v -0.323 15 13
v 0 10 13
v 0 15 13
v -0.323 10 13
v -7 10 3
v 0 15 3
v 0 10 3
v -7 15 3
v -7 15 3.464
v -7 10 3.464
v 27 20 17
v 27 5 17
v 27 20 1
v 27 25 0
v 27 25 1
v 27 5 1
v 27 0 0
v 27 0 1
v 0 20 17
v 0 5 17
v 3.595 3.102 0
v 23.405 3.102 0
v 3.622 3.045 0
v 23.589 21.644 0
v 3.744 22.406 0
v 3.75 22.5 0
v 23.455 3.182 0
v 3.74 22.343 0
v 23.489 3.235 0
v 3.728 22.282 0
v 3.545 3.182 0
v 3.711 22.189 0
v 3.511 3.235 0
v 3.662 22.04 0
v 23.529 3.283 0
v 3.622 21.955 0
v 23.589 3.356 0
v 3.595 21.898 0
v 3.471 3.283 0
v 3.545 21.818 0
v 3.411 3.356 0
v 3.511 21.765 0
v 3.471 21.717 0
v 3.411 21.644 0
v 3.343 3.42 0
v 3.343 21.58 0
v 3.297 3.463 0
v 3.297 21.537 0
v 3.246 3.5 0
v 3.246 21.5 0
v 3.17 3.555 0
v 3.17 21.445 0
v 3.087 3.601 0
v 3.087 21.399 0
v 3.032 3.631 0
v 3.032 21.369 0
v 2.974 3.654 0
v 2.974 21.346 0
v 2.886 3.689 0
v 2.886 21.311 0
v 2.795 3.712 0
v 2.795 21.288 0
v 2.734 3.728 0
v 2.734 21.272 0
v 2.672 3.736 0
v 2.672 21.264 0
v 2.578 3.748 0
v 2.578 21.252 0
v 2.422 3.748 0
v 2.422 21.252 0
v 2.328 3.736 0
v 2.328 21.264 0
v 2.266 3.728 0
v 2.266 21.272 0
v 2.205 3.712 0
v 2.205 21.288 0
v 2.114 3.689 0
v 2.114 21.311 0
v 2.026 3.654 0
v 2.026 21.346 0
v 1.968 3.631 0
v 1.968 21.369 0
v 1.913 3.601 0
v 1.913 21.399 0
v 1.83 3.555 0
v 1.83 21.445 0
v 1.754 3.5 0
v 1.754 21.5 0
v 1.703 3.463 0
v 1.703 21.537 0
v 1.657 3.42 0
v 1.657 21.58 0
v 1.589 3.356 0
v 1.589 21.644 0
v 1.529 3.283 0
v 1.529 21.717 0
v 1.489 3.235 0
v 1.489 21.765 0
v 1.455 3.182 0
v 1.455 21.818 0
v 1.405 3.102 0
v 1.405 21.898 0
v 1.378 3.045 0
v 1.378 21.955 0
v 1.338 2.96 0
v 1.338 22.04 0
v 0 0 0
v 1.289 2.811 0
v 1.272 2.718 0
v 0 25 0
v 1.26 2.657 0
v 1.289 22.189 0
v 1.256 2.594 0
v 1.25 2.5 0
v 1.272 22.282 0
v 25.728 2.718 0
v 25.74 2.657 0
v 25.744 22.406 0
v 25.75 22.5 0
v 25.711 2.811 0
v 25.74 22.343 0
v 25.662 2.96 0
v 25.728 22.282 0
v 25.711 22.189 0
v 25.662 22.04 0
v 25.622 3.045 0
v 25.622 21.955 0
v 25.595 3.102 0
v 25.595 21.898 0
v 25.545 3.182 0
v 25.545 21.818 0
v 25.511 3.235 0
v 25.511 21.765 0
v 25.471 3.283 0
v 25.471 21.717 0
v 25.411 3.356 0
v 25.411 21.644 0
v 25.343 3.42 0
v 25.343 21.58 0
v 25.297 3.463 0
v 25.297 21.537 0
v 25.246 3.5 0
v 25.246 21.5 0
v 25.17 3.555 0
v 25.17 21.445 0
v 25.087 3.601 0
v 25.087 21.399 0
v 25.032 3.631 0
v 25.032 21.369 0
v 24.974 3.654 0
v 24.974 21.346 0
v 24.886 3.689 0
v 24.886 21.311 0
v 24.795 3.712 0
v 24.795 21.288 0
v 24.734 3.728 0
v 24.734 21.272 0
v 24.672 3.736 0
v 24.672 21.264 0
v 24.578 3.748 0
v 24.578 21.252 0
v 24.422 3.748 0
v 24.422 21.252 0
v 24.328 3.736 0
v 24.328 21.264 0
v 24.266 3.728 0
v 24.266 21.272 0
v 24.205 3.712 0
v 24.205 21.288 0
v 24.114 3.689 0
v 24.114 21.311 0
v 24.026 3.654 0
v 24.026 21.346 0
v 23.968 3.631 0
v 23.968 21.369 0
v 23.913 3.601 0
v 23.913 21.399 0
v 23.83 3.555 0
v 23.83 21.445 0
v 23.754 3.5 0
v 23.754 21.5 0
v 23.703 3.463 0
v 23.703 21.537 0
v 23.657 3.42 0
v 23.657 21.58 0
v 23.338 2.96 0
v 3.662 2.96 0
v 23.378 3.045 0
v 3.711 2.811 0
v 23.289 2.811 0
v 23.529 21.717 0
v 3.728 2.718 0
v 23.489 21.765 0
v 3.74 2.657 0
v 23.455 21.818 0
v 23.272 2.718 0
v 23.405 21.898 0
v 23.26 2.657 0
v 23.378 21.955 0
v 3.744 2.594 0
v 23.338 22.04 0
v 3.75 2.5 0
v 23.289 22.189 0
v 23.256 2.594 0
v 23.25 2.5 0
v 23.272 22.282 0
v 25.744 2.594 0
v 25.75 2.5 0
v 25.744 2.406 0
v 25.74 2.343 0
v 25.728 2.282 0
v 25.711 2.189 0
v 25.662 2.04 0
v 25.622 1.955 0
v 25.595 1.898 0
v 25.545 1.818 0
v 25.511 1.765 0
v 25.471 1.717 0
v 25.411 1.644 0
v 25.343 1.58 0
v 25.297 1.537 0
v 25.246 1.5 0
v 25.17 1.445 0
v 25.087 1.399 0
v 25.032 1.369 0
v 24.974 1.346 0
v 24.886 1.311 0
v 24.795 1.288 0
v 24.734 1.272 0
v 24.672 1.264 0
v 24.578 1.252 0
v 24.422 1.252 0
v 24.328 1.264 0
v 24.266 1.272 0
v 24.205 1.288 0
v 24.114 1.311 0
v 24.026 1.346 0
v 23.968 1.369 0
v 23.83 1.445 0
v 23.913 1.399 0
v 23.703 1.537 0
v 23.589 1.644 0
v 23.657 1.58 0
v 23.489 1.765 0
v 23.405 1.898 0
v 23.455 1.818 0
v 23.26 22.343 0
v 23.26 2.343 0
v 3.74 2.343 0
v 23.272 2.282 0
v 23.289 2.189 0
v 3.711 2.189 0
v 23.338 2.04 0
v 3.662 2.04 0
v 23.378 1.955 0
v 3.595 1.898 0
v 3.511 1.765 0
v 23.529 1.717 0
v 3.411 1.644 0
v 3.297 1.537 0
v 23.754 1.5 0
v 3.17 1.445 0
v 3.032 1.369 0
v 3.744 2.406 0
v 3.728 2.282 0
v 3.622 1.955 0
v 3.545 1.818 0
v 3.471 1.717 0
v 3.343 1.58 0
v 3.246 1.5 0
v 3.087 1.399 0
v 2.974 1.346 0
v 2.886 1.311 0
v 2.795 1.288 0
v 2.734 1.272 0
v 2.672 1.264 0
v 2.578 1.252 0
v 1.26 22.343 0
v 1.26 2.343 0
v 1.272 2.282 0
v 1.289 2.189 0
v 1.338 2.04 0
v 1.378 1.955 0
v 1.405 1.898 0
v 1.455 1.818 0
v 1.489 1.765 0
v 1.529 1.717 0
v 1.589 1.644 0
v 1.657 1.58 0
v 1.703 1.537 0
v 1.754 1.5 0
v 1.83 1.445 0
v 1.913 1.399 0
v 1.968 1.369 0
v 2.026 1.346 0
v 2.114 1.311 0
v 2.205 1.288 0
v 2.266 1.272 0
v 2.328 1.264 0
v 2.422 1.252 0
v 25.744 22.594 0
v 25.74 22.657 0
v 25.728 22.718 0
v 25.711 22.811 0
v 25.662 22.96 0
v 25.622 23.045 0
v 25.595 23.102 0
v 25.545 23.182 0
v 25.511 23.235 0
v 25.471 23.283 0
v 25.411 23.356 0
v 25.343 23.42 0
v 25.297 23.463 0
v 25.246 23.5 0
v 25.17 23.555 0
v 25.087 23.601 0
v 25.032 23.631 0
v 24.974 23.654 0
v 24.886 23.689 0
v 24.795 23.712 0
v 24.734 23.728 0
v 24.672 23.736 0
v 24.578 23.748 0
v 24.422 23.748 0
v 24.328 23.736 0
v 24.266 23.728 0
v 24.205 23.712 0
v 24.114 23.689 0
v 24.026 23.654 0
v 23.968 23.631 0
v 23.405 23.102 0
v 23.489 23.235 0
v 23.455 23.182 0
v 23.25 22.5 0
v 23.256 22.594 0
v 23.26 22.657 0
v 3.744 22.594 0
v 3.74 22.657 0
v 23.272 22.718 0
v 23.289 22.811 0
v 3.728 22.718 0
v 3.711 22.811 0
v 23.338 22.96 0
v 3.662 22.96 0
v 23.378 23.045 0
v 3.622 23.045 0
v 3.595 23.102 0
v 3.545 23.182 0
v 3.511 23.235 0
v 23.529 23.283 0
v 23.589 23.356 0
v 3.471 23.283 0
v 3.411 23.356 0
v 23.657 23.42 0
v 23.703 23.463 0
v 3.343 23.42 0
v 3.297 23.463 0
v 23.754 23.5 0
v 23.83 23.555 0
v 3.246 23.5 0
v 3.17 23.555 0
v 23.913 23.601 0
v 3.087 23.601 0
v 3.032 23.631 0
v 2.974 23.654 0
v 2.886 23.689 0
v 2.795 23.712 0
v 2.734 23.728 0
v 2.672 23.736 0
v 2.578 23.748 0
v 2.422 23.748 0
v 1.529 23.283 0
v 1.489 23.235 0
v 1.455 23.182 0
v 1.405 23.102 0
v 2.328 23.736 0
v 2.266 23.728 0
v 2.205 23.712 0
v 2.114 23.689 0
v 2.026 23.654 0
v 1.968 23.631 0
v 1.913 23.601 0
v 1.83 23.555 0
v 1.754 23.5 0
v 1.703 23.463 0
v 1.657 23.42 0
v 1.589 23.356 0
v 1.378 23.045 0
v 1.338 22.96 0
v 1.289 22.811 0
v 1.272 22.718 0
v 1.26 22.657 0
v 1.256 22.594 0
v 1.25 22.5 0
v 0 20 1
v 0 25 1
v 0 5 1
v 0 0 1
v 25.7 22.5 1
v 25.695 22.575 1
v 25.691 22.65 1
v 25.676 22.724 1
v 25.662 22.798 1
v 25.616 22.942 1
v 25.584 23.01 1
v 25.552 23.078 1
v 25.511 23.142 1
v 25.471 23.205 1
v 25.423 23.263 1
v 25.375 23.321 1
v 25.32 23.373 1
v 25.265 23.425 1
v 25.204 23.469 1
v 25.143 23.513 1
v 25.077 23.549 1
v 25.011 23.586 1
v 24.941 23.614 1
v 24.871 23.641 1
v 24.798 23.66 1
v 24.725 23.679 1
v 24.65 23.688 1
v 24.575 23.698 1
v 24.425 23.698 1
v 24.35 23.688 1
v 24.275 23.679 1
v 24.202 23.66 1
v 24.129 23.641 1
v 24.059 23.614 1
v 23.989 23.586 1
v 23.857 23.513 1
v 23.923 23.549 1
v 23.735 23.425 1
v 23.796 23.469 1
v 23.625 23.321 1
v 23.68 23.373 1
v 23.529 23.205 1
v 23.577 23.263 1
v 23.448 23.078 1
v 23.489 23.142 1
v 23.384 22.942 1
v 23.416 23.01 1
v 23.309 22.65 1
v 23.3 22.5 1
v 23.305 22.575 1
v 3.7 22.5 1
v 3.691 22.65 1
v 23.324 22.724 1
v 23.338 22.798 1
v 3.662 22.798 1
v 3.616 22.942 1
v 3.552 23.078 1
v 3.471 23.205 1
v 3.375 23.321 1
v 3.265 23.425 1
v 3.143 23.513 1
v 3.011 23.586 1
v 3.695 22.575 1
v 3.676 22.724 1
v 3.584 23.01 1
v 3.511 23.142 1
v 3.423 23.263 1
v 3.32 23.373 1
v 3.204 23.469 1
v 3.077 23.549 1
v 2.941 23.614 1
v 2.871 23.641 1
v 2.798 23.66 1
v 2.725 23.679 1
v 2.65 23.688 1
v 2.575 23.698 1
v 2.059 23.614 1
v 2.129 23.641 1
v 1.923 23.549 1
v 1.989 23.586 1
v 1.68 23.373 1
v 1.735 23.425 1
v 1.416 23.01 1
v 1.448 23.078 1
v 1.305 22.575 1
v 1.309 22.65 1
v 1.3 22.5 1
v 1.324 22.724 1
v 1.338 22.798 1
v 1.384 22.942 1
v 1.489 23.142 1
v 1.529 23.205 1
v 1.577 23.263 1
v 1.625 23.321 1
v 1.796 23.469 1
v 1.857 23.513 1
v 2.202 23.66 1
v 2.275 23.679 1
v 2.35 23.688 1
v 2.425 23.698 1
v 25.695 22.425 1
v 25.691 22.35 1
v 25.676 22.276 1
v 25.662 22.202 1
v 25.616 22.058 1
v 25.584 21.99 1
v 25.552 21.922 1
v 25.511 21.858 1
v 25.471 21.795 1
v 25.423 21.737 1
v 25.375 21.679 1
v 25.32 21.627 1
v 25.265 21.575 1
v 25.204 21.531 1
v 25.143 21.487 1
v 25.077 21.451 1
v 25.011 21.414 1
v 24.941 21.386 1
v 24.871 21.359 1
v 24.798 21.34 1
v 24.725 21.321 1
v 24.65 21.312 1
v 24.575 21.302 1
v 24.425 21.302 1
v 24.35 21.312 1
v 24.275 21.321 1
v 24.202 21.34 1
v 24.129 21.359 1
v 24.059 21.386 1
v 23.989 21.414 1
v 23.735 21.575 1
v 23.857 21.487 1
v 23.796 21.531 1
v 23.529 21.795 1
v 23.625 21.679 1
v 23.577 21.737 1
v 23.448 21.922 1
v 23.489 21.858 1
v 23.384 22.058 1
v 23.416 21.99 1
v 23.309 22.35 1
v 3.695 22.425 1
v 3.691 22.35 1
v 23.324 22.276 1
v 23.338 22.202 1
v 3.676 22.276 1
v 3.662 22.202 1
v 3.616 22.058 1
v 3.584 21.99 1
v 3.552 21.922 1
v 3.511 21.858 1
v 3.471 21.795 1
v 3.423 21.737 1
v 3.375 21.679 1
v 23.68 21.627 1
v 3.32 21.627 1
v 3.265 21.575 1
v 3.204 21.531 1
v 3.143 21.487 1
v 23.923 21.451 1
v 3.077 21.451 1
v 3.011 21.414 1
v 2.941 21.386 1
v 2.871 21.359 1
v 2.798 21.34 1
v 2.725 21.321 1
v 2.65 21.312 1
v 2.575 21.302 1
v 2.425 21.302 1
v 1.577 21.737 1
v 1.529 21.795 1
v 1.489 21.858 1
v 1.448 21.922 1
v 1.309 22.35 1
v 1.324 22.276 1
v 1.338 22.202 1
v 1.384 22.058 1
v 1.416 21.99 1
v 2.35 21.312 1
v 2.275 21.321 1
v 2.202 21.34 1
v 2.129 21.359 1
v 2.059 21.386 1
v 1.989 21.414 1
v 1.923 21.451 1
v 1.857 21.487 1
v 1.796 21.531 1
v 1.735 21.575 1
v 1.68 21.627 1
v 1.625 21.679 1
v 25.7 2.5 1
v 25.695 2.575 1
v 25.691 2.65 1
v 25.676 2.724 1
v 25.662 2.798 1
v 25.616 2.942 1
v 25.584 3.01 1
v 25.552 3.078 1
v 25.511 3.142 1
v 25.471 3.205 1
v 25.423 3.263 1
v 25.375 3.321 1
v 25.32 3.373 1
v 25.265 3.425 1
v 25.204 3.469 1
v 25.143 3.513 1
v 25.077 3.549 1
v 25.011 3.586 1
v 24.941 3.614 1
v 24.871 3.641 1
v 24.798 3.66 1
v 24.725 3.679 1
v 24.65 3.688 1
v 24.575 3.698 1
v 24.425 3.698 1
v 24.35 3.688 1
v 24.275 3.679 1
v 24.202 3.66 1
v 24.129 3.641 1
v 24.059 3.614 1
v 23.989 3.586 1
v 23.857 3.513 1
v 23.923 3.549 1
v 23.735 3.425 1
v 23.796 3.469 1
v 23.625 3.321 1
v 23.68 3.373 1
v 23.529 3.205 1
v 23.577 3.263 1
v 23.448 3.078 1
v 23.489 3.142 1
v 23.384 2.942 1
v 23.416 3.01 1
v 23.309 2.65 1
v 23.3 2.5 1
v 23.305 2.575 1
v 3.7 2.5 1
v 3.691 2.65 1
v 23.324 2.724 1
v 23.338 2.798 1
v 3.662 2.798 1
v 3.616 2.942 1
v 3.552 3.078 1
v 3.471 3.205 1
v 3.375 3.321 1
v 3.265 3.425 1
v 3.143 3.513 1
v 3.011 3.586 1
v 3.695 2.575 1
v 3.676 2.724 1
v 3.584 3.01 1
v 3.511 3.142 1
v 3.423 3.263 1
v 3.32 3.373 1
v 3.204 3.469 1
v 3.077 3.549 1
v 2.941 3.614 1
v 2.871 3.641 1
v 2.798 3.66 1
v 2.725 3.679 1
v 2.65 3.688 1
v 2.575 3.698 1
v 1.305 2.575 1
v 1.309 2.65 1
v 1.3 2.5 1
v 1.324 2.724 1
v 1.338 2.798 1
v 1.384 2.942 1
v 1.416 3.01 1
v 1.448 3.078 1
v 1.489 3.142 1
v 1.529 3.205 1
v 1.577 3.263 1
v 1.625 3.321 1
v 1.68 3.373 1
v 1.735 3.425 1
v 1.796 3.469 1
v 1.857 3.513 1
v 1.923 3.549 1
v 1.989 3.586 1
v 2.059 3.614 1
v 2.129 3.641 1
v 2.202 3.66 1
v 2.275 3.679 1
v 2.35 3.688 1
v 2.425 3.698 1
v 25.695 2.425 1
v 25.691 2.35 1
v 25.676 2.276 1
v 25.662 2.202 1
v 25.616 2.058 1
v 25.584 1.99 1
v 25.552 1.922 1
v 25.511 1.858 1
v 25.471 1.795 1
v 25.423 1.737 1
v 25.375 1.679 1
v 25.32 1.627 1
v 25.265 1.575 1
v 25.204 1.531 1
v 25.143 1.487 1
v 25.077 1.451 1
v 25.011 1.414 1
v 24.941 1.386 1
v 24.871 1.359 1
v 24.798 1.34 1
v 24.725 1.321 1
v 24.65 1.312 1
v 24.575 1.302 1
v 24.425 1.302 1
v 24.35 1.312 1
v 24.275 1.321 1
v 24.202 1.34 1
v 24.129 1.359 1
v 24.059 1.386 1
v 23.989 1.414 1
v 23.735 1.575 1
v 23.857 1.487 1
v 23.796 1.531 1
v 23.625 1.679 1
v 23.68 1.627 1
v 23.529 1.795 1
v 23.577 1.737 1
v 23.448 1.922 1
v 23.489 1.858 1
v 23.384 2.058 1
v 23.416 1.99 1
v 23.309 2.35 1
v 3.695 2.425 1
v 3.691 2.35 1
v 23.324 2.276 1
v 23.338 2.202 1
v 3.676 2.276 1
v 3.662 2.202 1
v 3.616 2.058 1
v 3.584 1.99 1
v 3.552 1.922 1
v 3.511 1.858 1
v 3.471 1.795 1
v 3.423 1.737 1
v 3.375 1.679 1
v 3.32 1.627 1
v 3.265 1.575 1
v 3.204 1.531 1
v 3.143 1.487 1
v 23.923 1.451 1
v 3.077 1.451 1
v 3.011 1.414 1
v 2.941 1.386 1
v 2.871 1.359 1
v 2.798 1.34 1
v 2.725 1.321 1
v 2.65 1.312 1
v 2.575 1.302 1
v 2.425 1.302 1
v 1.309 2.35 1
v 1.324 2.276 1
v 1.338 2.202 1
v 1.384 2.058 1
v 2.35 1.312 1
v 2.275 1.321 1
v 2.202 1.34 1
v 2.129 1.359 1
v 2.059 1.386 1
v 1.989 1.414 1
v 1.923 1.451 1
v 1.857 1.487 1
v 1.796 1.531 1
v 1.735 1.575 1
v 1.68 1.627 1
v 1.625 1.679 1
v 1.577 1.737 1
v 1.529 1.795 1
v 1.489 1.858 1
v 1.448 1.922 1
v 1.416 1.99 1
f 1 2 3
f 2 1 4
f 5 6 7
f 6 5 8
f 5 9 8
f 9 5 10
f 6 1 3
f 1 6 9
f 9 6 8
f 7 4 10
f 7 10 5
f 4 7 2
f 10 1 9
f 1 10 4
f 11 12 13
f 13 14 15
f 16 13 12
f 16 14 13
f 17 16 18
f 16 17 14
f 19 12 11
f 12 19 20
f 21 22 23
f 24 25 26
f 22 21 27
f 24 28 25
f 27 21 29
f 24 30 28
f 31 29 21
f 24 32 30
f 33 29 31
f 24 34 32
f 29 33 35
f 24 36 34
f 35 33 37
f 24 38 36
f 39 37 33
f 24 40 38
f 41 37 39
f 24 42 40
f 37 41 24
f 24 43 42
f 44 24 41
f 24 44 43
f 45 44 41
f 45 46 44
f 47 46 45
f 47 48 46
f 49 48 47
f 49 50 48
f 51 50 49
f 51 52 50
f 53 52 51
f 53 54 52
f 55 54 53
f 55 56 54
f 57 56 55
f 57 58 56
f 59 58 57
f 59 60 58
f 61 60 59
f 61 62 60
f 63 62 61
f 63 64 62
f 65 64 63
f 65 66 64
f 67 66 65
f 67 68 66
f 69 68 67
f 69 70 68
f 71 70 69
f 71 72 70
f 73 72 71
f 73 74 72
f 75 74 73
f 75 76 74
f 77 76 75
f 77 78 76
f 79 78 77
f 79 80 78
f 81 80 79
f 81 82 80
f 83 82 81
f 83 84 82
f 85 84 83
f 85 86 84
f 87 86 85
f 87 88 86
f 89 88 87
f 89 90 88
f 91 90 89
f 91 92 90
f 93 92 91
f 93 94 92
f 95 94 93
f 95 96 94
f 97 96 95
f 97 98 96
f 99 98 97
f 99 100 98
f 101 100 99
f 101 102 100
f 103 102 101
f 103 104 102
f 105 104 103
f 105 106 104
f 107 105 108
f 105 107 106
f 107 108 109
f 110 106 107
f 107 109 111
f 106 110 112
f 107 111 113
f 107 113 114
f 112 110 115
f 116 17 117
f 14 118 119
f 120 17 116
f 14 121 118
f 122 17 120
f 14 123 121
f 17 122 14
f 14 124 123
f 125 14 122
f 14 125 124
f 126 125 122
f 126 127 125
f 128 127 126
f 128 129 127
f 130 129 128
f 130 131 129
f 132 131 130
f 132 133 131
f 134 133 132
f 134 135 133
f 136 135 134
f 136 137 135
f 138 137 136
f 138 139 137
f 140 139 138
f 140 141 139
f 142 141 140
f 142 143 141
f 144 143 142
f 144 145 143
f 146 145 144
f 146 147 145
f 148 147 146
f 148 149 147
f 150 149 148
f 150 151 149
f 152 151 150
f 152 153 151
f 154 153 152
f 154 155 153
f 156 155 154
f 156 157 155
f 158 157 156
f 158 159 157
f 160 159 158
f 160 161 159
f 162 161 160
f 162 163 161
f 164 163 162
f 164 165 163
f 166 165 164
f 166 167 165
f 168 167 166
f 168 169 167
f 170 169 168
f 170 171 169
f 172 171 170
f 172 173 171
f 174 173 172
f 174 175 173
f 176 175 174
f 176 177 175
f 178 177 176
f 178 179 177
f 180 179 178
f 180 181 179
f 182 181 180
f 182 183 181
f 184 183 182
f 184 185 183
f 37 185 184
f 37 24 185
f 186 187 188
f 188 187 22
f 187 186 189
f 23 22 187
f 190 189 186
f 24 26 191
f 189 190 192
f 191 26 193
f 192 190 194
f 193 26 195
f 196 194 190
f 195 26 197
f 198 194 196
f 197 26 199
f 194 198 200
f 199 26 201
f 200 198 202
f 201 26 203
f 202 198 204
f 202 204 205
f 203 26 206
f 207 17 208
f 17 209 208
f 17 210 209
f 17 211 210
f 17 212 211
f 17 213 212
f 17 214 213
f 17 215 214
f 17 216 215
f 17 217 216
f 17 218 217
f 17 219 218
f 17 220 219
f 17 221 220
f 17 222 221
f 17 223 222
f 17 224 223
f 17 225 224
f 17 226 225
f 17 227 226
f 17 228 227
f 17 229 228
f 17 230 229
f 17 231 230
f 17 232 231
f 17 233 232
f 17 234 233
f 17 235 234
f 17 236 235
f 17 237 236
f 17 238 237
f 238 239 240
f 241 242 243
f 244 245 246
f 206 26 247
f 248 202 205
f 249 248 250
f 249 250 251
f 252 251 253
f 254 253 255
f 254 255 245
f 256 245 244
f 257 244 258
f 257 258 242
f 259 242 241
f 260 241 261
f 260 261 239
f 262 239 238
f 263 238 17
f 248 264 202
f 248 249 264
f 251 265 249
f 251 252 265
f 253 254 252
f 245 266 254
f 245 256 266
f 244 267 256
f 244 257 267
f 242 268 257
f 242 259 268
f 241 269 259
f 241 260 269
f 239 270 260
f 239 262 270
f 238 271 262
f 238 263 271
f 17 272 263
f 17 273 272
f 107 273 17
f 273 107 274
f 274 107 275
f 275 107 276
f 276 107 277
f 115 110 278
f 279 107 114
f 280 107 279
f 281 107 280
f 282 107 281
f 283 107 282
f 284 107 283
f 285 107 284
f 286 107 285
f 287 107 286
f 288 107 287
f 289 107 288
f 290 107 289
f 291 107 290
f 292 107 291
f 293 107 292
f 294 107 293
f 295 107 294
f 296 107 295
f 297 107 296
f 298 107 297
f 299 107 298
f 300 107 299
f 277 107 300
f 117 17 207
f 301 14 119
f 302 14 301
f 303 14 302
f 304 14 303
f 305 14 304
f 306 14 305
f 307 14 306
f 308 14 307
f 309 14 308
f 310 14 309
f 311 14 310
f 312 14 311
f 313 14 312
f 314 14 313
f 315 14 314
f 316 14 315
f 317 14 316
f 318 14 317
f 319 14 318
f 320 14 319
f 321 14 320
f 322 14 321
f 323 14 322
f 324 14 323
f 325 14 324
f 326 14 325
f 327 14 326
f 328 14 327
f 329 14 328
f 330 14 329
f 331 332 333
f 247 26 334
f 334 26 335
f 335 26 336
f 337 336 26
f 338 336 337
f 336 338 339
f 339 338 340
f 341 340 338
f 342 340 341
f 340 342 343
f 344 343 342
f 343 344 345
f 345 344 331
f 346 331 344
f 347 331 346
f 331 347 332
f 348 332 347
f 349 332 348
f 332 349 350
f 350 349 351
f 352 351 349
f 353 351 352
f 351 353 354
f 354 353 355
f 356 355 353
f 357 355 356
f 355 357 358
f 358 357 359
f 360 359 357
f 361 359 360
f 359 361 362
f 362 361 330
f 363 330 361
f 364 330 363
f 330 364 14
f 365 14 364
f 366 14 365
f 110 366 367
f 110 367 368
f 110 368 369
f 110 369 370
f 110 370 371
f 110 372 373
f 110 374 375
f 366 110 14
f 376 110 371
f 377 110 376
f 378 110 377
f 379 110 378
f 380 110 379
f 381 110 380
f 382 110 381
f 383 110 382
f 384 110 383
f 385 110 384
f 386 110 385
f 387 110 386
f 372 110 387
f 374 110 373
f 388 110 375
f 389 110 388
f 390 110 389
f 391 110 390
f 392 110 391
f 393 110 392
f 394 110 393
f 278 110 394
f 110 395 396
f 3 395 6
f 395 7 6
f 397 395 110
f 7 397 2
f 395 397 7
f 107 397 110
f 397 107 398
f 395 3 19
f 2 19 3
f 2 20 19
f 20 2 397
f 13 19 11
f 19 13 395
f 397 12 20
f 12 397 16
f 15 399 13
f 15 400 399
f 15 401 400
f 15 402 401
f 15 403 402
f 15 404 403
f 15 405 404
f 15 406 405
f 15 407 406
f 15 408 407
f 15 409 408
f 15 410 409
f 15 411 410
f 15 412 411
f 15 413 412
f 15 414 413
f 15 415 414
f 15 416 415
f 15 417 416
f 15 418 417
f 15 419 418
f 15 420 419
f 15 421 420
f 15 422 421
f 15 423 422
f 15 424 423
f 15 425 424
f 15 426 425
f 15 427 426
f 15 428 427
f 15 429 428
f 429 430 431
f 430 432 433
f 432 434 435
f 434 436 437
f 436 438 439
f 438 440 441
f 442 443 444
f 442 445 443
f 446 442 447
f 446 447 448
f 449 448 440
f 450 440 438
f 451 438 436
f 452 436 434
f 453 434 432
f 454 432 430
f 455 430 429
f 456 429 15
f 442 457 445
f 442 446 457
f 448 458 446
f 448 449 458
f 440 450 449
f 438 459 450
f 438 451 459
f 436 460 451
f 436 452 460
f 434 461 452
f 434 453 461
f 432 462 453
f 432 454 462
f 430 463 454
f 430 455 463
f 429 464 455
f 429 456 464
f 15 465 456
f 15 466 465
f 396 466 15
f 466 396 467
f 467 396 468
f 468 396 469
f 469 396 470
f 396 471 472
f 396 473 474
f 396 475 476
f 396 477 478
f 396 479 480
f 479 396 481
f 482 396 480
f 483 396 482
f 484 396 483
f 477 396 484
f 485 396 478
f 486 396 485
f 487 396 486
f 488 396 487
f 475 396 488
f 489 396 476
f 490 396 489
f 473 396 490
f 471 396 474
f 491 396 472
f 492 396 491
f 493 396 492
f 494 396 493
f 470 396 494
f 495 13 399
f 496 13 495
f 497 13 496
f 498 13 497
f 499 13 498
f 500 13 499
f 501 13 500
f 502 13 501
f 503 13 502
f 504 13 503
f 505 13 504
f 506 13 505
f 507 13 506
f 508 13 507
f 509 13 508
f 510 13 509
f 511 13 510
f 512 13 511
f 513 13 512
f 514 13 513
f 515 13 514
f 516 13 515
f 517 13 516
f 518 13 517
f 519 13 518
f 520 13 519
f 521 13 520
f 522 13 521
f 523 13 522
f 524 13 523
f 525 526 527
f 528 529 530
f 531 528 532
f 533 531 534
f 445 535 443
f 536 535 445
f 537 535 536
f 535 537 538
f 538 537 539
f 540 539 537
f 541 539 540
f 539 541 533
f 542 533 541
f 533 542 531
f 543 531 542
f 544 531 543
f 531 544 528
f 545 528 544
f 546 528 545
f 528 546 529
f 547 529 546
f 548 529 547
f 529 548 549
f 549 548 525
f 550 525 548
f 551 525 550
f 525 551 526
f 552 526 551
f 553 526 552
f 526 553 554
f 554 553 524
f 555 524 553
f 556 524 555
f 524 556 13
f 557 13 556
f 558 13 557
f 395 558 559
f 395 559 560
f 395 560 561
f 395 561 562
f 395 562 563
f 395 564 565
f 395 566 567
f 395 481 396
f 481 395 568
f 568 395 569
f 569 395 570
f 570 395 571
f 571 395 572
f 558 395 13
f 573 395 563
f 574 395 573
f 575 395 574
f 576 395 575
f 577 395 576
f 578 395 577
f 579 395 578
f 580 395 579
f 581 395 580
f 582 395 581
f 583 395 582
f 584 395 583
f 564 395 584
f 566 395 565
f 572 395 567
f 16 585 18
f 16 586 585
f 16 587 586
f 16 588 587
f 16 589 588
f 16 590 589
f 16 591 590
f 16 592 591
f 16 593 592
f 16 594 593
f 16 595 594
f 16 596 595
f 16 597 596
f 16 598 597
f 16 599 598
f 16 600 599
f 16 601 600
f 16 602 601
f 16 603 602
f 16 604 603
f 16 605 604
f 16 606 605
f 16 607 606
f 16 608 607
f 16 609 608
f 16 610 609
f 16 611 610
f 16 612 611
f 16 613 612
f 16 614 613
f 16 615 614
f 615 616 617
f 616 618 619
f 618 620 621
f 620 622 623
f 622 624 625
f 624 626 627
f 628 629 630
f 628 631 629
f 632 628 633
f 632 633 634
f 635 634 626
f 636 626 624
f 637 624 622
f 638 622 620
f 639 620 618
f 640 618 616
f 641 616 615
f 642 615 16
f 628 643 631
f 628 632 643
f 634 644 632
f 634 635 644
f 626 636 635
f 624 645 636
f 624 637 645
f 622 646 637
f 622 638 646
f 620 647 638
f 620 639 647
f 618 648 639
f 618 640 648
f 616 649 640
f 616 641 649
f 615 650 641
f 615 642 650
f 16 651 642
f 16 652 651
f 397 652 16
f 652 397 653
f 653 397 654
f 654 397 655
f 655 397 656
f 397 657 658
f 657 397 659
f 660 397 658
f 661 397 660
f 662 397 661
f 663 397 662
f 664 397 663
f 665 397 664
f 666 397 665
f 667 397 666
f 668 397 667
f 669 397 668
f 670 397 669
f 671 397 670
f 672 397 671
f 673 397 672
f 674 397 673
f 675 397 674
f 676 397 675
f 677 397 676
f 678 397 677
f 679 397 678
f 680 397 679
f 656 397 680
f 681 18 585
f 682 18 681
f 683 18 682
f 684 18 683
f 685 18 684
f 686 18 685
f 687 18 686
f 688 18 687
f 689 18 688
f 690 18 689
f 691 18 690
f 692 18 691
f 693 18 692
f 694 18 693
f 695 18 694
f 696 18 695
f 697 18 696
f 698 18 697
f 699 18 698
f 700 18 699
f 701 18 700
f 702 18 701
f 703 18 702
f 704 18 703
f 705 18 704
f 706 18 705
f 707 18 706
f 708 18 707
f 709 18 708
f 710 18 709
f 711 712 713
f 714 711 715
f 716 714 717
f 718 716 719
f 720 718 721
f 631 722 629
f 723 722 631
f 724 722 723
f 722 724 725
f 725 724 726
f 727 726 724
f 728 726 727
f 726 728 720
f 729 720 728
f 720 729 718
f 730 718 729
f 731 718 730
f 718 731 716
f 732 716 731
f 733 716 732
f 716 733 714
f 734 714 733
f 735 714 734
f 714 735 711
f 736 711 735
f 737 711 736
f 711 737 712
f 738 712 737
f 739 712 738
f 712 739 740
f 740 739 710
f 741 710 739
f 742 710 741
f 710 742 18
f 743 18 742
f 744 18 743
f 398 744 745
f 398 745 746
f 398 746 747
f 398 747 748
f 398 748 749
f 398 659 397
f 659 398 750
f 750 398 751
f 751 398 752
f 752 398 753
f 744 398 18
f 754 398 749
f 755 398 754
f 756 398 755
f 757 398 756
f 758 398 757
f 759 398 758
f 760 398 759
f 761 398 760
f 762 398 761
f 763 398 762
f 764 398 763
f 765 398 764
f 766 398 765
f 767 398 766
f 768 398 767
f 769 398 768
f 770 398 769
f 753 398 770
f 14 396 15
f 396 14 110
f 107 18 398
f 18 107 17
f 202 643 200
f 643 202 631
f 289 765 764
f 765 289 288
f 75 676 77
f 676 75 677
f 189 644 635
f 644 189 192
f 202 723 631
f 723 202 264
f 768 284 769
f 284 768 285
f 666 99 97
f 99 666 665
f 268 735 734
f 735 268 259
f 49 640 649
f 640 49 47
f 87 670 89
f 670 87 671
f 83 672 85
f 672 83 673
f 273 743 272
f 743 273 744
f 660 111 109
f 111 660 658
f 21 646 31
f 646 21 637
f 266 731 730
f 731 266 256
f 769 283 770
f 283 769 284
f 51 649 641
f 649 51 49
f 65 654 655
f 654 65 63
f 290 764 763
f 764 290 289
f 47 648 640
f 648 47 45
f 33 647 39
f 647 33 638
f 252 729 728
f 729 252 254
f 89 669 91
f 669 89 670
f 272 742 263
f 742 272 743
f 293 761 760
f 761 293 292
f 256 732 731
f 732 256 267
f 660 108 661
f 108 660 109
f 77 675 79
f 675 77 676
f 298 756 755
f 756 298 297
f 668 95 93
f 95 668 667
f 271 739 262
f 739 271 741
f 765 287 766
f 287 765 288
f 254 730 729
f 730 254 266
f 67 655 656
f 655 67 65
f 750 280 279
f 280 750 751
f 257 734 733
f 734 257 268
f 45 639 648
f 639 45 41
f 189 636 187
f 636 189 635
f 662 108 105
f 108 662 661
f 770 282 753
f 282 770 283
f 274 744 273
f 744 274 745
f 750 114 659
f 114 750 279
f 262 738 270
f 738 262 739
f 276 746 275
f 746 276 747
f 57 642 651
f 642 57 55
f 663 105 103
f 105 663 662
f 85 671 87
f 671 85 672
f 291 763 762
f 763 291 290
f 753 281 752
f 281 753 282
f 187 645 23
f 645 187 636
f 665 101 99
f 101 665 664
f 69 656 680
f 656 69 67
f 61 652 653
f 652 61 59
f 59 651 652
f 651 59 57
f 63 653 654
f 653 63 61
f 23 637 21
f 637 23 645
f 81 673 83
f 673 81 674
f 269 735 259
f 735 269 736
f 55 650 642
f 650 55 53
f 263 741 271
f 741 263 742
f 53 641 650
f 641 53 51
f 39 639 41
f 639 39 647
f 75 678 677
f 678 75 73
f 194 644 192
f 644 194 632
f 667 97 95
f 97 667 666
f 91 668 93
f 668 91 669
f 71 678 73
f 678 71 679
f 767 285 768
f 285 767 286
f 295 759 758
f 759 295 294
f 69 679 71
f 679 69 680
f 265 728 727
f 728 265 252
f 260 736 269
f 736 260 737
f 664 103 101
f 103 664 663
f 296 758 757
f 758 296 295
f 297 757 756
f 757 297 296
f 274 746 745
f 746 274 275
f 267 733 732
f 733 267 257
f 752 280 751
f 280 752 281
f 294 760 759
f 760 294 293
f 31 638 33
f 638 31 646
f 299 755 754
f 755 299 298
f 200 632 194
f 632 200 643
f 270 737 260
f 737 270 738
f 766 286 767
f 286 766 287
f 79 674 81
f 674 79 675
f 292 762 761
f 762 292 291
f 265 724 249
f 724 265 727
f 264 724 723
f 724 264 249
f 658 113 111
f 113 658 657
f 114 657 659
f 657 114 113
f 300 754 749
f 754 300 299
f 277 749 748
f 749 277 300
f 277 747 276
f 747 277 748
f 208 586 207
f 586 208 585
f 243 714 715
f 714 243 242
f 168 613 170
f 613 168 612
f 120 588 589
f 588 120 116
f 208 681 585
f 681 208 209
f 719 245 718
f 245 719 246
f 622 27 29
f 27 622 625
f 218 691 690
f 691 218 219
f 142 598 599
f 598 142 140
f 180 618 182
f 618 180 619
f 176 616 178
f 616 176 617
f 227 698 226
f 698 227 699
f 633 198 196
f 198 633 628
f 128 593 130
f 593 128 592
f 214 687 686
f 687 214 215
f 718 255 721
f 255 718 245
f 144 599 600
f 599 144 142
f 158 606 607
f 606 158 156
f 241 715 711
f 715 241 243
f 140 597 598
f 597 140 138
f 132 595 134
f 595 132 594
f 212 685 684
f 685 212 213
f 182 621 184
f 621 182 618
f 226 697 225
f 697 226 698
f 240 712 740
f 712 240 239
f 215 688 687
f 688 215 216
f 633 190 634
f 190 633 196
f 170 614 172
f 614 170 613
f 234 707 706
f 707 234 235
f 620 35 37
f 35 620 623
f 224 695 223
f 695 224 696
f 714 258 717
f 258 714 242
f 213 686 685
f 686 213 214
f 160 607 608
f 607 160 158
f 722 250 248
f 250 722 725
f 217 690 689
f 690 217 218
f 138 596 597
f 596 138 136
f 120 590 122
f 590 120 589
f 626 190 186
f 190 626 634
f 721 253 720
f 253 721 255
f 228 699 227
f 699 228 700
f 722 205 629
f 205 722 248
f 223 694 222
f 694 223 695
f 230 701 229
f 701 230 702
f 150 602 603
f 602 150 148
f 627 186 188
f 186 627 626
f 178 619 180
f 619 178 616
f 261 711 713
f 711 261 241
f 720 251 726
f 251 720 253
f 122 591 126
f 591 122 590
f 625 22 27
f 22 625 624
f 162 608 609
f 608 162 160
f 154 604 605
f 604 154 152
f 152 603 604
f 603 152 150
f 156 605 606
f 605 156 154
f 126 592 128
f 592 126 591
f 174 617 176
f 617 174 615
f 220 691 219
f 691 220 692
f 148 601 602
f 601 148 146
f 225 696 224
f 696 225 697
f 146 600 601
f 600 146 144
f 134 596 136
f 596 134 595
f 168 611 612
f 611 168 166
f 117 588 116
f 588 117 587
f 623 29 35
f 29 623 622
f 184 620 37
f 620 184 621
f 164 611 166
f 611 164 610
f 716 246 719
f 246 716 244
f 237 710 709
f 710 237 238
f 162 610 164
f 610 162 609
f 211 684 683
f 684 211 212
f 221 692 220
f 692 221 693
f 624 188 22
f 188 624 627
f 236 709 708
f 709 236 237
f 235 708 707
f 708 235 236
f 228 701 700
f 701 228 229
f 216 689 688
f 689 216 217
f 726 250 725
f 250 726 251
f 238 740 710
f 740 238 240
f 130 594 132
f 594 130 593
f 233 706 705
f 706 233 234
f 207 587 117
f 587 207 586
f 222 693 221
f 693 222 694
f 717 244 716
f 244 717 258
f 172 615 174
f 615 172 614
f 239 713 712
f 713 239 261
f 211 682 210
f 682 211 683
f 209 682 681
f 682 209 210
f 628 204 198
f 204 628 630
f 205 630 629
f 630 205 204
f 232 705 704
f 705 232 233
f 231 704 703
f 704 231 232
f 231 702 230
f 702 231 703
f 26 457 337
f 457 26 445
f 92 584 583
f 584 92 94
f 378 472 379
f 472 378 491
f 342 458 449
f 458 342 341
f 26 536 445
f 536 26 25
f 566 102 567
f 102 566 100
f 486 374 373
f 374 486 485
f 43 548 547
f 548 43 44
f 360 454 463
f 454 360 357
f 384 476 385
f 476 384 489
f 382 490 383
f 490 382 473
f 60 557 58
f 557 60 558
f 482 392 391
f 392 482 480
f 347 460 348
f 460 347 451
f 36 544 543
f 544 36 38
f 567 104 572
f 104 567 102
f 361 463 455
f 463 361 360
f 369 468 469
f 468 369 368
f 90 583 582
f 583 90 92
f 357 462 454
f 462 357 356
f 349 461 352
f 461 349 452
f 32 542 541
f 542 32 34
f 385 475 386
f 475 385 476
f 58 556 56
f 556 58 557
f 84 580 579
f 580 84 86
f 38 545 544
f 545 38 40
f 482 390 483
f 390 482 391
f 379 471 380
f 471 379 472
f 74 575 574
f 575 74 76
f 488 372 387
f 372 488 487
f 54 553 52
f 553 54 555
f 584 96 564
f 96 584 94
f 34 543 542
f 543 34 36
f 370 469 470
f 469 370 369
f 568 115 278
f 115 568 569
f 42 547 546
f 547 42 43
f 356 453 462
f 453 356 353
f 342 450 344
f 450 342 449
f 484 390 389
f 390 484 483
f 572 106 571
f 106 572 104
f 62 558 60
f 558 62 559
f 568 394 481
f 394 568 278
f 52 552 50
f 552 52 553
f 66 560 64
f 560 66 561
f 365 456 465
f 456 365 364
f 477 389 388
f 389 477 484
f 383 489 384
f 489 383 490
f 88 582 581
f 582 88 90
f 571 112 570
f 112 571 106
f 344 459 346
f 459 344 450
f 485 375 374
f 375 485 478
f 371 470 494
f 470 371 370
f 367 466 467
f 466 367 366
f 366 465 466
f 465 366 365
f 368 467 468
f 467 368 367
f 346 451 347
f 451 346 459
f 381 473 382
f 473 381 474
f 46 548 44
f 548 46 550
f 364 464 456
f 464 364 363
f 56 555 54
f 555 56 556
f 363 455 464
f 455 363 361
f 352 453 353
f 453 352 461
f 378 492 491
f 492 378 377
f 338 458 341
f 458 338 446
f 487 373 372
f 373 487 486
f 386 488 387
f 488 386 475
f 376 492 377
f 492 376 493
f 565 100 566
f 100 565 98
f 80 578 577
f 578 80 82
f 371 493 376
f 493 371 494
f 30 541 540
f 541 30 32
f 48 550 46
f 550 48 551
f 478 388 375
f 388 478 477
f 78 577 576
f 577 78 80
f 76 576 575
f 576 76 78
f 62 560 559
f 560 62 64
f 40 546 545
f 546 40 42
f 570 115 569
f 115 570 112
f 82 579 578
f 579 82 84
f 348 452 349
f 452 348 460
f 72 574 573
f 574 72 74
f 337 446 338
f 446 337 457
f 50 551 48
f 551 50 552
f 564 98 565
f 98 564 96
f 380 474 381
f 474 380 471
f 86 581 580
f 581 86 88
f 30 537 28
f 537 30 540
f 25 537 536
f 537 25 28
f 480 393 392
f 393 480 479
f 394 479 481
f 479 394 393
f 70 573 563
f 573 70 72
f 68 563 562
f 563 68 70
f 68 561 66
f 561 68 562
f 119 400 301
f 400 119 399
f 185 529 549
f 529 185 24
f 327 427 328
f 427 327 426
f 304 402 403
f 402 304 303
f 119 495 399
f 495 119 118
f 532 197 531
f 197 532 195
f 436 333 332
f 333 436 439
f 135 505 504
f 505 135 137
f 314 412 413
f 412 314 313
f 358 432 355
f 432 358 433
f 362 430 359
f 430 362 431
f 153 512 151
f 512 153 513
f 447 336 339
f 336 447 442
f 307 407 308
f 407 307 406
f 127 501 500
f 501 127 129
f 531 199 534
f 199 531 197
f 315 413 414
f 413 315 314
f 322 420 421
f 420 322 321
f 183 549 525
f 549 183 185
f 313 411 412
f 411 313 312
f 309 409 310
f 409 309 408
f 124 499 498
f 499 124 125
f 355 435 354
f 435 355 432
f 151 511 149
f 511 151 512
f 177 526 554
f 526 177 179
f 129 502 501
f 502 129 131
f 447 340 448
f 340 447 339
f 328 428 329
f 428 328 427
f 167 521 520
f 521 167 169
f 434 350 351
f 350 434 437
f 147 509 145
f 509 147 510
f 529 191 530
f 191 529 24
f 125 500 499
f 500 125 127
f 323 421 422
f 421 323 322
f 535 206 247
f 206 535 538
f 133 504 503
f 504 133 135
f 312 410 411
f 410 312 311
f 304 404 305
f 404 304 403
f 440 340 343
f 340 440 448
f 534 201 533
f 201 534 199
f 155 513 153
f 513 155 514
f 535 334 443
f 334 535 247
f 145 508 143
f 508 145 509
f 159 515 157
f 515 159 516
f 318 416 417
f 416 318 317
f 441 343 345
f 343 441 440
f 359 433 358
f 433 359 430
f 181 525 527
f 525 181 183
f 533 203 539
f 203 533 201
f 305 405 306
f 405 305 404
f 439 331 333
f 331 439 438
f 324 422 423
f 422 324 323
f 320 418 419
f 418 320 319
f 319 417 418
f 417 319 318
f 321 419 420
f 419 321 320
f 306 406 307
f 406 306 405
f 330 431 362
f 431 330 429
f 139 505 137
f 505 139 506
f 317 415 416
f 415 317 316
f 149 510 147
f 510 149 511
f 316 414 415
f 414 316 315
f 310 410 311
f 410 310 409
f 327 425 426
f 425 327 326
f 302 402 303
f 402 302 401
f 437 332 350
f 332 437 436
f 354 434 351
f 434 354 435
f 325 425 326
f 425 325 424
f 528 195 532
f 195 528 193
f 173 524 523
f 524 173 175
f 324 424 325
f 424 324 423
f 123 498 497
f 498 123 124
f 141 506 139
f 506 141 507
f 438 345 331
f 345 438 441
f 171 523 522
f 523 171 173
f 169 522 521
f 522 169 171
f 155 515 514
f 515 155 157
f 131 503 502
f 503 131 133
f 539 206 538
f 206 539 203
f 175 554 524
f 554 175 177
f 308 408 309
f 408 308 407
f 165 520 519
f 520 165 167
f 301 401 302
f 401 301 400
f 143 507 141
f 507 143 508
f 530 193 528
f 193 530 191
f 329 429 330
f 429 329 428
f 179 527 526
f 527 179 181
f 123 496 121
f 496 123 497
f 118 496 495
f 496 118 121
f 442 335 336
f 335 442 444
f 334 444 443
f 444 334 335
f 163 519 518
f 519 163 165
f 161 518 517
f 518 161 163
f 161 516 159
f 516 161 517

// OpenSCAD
fn=50;
whole_radius=1.5;

module locker_model()
{
    union()
    {
        difference() 
        {
            union()
            {
                 rotate([0, 0, 0])  translate([0, 5, 0])  cube([27,15,17],false);
                 rotate([0, 0, 0])  translate([0, 0, 0])  cube([27,25,1],false);
                 translate([0, 0, 3]) 
                 difference() 
                 {
                     rotate([0, 0, 0])  translate([-7, 10, 0])  cube([27,5,10],false);
                     rotate([0, 35, 0])  translate([-16, 9, -5])  cube([10,7,15],false);
                }
            }
           rotate([0, 0, 0])  translate([2.5, 2.5, -5])  cylinder(10, whole_radius, $fn=fn);
           rotate([0, 0, 0])  translate([24.5, 2.5, -5])  cylinder(10, whole_radius, $fn=fn);
           rotate([0, 0, 0])  translate([2.5, 22.5, -5])  cylinder(10, whole_radius, $fn=fn);
           rotate([0, 0, 0])  translate([24.5, 22.5, -5])  cylinder(10, whole_radius, $fn=fn);
        }
    }
}


translate([0,0,0])locker_model();
   
